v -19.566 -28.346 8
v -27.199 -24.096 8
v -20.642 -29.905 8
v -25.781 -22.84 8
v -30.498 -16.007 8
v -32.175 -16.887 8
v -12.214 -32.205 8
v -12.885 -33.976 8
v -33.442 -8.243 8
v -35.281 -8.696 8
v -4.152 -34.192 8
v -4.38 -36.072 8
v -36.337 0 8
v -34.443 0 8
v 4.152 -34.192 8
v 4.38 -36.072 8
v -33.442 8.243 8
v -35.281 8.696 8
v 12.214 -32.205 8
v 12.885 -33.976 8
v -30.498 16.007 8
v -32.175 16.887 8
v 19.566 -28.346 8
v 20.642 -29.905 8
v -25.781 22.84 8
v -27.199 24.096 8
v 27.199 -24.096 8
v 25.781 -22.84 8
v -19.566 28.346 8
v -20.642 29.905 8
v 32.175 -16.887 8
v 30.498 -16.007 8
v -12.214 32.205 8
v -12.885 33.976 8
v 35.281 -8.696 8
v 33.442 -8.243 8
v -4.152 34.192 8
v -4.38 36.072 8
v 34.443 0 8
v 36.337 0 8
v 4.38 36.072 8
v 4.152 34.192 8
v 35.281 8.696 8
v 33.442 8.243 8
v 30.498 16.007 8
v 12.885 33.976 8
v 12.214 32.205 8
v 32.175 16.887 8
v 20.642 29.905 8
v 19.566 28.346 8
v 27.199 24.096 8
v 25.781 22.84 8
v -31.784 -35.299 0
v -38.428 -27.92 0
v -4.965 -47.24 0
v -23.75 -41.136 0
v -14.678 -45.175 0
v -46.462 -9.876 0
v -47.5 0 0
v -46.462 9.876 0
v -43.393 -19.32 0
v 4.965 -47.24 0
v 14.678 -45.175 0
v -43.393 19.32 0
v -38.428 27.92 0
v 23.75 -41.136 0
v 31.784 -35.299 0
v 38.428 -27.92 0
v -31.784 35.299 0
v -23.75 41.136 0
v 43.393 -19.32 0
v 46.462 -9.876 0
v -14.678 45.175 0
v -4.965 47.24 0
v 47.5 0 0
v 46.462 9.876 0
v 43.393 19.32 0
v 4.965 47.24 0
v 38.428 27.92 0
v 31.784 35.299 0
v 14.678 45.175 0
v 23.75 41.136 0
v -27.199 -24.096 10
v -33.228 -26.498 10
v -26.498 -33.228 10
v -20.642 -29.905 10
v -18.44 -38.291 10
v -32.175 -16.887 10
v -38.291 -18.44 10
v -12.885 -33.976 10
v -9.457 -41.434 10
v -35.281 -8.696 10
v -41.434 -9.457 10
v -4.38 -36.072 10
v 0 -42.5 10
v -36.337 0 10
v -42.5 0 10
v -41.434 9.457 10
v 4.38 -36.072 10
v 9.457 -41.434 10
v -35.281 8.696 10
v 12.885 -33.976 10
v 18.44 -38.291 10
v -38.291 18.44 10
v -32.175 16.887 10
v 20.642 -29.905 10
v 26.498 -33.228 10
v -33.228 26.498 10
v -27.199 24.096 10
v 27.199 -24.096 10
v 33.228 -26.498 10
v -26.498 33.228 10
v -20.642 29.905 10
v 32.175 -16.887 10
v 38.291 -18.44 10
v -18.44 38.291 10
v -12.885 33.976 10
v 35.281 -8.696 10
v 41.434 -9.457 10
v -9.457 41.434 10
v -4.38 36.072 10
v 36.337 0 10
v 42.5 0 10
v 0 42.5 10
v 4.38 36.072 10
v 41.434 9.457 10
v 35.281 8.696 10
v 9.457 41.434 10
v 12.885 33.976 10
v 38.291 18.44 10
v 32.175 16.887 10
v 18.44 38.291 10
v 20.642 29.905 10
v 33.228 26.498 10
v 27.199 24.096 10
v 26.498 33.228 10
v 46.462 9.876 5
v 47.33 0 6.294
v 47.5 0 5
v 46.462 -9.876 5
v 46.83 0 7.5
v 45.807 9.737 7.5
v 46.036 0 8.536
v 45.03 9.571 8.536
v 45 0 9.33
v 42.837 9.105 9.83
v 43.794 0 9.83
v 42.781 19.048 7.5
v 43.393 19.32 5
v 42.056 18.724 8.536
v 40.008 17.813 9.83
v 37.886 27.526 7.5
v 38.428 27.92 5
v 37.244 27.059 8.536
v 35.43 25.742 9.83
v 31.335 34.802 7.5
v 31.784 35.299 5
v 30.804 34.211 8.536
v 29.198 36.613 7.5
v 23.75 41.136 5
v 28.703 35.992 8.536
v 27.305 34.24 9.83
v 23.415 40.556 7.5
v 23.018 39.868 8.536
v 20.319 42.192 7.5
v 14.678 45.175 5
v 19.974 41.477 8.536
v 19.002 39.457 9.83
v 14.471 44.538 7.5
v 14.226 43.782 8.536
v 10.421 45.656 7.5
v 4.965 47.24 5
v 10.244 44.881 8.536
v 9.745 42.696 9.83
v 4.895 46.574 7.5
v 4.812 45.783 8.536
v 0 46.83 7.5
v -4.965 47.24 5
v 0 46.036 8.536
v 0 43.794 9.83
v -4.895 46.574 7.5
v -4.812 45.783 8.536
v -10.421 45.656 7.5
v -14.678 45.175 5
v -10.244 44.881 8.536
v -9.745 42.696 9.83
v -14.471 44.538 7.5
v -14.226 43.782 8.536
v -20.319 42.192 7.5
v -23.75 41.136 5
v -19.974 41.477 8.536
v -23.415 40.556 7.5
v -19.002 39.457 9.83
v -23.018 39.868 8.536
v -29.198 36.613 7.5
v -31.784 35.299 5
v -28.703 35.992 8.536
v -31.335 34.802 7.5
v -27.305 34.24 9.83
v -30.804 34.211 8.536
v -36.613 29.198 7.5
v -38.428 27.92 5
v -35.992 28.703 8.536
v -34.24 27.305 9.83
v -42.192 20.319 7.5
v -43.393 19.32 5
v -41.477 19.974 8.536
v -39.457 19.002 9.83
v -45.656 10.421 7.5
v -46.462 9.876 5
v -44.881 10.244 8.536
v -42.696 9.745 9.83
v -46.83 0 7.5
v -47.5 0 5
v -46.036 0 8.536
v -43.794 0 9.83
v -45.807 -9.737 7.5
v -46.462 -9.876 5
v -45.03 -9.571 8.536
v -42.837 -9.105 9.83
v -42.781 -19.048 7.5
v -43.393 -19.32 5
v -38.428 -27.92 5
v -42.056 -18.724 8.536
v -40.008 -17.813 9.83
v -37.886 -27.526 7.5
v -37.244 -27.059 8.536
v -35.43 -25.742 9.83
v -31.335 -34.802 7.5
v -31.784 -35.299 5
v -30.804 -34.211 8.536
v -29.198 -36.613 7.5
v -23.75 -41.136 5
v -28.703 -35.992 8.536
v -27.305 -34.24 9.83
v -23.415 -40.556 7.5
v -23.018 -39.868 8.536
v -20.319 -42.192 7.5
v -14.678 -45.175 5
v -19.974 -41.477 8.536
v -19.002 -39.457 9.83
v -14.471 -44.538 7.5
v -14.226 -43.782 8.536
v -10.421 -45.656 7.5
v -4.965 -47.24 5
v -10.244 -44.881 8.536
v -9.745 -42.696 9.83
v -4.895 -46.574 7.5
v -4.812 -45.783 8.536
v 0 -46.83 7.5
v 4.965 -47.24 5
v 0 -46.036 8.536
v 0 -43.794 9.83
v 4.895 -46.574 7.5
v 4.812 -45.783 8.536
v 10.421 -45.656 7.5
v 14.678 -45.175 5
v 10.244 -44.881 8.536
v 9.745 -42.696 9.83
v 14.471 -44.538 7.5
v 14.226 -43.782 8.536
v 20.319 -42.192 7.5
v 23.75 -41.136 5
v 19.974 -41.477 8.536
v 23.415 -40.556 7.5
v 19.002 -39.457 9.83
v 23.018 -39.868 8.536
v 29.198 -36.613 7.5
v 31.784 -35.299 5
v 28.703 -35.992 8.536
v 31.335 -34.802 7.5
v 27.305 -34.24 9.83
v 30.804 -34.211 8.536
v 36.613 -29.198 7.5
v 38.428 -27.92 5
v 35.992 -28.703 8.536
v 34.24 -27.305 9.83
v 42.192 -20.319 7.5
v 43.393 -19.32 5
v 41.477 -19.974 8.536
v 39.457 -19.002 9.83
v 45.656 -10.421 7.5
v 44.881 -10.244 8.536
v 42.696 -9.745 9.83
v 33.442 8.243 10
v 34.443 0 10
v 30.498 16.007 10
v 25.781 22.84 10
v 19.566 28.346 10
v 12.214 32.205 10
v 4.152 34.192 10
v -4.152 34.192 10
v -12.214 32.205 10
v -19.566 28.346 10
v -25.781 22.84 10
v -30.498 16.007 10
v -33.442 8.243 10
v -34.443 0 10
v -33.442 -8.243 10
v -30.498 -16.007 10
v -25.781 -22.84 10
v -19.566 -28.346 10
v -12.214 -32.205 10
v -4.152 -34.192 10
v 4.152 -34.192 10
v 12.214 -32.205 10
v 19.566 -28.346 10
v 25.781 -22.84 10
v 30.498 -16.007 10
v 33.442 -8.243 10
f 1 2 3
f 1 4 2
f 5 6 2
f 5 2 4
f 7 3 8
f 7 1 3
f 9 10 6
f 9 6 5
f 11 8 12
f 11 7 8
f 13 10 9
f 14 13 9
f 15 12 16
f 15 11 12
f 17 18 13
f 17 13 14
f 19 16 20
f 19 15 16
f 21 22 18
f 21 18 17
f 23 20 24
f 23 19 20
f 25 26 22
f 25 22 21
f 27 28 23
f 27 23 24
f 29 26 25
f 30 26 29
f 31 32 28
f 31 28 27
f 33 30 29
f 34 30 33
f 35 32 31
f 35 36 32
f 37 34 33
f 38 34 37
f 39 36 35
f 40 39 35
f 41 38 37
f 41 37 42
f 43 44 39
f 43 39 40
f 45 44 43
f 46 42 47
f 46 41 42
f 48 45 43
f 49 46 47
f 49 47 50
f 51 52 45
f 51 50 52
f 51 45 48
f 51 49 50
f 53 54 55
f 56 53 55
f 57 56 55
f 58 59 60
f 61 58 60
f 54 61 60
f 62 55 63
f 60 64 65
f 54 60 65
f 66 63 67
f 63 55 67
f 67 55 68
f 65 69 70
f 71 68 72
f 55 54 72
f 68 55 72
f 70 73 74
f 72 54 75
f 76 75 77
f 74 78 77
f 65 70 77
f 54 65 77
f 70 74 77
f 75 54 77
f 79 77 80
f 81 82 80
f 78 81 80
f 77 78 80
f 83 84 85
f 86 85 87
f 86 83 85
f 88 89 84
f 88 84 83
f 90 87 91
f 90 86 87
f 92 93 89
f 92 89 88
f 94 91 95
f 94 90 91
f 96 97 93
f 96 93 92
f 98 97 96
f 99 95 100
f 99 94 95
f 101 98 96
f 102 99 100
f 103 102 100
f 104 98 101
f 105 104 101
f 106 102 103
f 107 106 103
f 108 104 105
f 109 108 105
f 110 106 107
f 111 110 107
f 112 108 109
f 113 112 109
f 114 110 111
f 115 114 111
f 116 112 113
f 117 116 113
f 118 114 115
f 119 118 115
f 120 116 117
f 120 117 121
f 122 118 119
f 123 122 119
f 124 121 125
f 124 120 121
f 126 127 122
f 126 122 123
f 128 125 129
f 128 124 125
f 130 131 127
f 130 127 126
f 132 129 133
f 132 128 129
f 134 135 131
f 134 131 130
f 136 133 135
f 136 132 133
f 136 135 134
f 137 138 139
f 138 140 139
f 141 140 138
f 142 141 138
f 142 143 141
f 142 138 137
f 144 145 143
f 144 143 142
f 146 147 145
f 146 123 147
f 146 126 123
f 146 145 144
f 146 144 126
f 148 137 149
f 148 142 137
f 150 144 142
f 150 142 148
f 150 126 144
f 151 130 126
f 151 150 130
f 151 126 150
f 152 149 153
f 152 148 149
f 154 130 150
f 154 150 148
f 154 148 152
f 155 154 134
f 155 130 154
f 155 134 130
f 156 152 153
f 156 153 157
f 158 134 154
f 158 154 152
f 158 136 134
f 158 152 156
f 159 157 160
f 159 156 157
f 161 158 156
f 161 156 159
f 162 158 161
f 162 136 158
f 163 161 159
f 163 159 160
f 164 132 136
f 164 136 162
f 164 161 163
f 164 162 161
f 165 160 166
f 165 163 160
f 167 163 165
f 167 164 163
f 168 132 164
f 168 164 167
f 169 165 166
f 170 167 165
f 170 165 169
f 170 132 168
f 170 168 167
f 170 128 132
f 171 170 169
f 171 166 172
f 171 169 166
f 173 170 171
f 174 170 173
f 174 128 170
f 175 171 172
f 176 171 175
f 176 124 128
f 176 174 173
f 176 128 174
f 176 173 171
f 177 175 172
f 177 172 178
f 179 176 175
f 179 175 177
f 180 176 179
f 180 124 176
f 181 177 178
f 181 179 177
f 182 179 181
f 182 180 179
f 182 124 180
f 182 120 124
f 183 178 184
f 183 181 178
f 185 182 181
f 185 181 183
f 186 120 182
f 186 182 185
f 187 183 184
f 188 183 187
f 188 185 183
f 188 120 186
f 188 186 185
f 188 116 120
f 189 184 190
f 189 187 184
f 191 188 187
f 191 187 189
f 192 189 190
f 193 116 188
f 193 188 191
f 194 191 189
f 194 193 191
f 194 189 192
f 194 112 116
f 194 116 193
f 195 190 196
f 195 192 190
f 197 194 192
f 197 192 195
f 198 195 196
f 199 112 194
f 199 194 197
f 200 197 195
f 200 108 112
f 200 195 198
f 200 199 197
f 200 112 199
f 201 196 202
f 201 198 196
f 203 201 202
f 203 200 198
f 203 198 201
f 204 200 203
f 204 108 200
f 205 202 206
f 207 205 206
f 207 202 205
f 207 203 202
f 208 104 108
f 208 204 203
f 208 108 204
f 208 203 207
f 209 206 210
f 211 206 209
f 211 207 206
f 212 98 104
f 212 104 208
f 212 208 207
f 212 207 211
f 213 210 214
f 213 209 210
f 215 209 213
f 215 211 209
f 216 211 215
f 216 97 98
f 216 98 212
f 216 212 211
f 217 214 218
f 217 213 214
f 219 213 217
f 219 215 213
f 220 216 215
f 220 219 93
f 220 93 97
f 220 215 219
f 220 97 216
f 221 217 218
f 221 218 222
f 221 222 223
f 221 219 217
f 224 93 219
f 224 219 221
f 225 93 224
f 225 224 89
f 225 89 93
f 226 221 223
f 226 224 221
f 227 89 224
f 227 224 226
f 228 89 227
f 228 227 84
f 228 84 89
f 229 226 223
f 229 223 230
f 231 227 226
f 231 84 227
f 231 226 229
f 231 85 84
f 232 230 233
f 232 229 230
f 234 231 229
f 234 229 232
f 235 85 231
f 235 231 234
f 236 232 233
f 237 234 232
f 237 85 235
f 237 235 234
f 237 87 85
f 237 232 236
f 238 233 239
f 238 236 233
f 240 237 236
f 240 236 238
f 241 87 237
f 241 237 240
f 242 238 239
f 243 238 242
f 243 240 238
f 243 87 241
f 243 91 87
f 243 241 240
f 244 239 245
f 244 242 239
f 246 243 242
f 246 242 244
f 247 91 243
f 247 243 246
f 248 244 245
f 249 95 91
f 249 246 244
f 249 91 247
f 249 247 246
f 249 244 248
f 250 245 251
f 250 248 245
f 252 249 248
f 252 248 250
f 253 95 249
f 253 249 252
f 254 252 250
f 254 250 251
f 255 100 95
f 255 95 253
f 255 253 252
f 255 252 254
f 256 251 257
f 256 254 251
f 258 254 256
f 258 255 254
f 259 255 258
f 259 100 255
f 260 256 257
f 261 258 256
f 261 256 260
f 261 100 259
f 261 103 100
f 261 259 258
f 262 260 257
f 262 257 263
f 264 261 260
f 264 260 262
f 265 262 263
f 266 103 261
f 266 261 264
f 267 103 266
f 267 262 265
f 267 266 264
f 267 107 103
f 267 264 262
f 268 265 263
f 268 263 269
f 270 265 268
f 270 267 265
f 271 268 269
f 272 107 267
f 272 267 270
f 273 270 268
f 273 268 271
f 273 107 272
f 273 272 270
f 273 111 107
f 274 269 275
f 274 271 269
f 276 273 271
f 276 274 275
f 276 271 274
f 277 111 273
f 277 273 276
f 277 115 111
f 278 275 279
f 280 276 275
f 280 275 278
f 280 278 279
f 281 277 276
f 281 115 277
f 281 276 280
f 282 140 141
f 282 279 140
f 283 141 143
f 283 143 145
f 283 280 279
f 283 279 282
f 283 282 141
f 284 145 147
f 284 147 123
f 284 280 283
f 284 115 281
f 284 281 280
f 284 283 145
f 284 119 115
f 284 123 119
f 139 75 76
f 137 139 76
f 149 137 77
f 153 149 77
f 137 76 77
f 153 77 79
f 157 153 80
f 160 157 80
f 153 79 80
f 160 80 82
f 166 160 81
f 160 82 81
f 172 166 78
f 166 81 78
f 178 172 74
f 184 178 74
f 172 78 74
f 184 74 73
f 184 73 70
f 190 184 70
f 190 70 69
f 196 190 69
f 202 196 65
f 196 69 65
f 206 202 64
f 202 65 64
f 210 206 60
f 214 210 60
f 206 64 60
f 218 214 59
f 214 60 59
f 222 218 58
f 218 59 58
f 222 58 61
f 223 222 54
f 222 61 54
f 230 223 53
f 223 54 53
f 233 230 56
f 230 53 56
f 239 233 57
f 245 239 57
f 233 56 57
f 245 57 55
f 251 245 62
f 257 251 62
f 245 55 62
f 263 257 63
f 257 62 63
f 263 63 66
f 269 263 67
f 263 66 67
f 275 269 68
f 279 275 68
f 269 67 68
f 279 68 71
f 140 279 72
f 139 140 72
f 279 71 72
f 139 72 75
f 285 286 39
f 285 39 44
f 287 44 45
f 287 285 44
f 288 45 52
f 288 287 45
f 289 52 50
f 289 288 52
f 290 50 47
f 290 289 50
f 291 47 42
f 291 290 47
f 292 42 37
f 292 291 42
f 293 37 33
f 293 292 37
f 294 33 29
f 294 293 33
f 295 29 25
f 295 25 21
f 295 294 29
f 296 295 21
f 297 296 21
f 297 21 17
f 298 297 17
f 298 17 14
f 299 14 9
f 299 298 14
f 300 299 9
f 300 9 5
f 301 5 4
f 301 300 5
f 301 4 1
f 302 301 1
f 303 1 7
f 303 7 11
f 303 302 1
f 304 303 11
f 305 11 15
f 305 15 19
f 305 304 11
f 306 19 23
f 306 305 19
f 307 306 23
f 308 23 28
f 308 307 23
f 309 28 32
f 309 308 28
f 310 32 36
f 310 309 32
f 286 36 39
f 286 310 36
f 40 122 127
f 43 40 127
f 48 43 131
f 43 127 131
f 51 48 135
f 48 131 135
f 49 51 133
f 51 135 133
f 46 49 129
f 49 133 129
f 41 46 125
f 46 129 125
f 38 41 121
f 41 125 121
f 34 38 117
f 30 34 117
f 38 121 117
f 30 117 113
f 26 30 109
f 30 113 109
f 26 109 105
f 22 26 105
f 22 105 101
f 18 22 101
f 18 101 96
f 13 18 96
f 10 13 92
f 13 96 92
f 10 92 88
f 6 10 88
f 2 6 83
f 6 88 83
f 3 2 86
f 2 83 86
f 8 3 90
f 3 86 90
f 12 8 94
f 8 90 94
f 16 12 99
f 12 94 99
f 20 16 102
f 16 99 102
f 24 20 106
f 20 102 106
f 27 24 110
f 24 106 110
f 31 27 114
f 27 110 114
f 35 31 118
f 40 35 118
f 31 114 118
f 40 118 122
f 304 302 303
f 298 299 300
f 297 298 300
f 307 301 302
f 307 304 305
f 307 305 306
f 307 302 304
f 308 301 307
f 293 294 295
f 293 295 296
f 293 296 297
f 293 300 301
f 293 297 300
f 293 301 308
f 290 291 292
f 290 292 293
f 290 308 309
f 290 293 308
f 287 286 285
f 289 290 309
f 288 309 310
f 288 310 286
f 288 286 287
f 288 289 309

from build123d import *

# Parameters (mm, degrees)
F0_R     = 47.5
F1_DEPTH = 10
F2_R     = 5
F3_R     = 36.336935
F3_R_2   = 34.443129
F4_DEPTH = 2


with BuildPart() as f1:
    # F0 (on Top) → F1 (new body)
    with BuildSketch(Plane.XY):
        Circle(F0_R)
    extrude(amount=F1_DEPTH)

    # F2
    f2_edges = [f1.edges().sort_by_distance(p)[0] for p in [
        (-47.5, 0, 10),
    ]]
    fillet(f2_edges, radius=F2_R)

    # F3 (on face) → F4 (cut)
    with BuildSketch(Plane.XY.offset(10)):
        Circle(F3_R)
        Circle(F3_R_2, mode=Mode.SUBTRACT)
    extrude(amount=-F4_DEPTH, mode=Mode.SUBTRACT)


solid = f1.part
